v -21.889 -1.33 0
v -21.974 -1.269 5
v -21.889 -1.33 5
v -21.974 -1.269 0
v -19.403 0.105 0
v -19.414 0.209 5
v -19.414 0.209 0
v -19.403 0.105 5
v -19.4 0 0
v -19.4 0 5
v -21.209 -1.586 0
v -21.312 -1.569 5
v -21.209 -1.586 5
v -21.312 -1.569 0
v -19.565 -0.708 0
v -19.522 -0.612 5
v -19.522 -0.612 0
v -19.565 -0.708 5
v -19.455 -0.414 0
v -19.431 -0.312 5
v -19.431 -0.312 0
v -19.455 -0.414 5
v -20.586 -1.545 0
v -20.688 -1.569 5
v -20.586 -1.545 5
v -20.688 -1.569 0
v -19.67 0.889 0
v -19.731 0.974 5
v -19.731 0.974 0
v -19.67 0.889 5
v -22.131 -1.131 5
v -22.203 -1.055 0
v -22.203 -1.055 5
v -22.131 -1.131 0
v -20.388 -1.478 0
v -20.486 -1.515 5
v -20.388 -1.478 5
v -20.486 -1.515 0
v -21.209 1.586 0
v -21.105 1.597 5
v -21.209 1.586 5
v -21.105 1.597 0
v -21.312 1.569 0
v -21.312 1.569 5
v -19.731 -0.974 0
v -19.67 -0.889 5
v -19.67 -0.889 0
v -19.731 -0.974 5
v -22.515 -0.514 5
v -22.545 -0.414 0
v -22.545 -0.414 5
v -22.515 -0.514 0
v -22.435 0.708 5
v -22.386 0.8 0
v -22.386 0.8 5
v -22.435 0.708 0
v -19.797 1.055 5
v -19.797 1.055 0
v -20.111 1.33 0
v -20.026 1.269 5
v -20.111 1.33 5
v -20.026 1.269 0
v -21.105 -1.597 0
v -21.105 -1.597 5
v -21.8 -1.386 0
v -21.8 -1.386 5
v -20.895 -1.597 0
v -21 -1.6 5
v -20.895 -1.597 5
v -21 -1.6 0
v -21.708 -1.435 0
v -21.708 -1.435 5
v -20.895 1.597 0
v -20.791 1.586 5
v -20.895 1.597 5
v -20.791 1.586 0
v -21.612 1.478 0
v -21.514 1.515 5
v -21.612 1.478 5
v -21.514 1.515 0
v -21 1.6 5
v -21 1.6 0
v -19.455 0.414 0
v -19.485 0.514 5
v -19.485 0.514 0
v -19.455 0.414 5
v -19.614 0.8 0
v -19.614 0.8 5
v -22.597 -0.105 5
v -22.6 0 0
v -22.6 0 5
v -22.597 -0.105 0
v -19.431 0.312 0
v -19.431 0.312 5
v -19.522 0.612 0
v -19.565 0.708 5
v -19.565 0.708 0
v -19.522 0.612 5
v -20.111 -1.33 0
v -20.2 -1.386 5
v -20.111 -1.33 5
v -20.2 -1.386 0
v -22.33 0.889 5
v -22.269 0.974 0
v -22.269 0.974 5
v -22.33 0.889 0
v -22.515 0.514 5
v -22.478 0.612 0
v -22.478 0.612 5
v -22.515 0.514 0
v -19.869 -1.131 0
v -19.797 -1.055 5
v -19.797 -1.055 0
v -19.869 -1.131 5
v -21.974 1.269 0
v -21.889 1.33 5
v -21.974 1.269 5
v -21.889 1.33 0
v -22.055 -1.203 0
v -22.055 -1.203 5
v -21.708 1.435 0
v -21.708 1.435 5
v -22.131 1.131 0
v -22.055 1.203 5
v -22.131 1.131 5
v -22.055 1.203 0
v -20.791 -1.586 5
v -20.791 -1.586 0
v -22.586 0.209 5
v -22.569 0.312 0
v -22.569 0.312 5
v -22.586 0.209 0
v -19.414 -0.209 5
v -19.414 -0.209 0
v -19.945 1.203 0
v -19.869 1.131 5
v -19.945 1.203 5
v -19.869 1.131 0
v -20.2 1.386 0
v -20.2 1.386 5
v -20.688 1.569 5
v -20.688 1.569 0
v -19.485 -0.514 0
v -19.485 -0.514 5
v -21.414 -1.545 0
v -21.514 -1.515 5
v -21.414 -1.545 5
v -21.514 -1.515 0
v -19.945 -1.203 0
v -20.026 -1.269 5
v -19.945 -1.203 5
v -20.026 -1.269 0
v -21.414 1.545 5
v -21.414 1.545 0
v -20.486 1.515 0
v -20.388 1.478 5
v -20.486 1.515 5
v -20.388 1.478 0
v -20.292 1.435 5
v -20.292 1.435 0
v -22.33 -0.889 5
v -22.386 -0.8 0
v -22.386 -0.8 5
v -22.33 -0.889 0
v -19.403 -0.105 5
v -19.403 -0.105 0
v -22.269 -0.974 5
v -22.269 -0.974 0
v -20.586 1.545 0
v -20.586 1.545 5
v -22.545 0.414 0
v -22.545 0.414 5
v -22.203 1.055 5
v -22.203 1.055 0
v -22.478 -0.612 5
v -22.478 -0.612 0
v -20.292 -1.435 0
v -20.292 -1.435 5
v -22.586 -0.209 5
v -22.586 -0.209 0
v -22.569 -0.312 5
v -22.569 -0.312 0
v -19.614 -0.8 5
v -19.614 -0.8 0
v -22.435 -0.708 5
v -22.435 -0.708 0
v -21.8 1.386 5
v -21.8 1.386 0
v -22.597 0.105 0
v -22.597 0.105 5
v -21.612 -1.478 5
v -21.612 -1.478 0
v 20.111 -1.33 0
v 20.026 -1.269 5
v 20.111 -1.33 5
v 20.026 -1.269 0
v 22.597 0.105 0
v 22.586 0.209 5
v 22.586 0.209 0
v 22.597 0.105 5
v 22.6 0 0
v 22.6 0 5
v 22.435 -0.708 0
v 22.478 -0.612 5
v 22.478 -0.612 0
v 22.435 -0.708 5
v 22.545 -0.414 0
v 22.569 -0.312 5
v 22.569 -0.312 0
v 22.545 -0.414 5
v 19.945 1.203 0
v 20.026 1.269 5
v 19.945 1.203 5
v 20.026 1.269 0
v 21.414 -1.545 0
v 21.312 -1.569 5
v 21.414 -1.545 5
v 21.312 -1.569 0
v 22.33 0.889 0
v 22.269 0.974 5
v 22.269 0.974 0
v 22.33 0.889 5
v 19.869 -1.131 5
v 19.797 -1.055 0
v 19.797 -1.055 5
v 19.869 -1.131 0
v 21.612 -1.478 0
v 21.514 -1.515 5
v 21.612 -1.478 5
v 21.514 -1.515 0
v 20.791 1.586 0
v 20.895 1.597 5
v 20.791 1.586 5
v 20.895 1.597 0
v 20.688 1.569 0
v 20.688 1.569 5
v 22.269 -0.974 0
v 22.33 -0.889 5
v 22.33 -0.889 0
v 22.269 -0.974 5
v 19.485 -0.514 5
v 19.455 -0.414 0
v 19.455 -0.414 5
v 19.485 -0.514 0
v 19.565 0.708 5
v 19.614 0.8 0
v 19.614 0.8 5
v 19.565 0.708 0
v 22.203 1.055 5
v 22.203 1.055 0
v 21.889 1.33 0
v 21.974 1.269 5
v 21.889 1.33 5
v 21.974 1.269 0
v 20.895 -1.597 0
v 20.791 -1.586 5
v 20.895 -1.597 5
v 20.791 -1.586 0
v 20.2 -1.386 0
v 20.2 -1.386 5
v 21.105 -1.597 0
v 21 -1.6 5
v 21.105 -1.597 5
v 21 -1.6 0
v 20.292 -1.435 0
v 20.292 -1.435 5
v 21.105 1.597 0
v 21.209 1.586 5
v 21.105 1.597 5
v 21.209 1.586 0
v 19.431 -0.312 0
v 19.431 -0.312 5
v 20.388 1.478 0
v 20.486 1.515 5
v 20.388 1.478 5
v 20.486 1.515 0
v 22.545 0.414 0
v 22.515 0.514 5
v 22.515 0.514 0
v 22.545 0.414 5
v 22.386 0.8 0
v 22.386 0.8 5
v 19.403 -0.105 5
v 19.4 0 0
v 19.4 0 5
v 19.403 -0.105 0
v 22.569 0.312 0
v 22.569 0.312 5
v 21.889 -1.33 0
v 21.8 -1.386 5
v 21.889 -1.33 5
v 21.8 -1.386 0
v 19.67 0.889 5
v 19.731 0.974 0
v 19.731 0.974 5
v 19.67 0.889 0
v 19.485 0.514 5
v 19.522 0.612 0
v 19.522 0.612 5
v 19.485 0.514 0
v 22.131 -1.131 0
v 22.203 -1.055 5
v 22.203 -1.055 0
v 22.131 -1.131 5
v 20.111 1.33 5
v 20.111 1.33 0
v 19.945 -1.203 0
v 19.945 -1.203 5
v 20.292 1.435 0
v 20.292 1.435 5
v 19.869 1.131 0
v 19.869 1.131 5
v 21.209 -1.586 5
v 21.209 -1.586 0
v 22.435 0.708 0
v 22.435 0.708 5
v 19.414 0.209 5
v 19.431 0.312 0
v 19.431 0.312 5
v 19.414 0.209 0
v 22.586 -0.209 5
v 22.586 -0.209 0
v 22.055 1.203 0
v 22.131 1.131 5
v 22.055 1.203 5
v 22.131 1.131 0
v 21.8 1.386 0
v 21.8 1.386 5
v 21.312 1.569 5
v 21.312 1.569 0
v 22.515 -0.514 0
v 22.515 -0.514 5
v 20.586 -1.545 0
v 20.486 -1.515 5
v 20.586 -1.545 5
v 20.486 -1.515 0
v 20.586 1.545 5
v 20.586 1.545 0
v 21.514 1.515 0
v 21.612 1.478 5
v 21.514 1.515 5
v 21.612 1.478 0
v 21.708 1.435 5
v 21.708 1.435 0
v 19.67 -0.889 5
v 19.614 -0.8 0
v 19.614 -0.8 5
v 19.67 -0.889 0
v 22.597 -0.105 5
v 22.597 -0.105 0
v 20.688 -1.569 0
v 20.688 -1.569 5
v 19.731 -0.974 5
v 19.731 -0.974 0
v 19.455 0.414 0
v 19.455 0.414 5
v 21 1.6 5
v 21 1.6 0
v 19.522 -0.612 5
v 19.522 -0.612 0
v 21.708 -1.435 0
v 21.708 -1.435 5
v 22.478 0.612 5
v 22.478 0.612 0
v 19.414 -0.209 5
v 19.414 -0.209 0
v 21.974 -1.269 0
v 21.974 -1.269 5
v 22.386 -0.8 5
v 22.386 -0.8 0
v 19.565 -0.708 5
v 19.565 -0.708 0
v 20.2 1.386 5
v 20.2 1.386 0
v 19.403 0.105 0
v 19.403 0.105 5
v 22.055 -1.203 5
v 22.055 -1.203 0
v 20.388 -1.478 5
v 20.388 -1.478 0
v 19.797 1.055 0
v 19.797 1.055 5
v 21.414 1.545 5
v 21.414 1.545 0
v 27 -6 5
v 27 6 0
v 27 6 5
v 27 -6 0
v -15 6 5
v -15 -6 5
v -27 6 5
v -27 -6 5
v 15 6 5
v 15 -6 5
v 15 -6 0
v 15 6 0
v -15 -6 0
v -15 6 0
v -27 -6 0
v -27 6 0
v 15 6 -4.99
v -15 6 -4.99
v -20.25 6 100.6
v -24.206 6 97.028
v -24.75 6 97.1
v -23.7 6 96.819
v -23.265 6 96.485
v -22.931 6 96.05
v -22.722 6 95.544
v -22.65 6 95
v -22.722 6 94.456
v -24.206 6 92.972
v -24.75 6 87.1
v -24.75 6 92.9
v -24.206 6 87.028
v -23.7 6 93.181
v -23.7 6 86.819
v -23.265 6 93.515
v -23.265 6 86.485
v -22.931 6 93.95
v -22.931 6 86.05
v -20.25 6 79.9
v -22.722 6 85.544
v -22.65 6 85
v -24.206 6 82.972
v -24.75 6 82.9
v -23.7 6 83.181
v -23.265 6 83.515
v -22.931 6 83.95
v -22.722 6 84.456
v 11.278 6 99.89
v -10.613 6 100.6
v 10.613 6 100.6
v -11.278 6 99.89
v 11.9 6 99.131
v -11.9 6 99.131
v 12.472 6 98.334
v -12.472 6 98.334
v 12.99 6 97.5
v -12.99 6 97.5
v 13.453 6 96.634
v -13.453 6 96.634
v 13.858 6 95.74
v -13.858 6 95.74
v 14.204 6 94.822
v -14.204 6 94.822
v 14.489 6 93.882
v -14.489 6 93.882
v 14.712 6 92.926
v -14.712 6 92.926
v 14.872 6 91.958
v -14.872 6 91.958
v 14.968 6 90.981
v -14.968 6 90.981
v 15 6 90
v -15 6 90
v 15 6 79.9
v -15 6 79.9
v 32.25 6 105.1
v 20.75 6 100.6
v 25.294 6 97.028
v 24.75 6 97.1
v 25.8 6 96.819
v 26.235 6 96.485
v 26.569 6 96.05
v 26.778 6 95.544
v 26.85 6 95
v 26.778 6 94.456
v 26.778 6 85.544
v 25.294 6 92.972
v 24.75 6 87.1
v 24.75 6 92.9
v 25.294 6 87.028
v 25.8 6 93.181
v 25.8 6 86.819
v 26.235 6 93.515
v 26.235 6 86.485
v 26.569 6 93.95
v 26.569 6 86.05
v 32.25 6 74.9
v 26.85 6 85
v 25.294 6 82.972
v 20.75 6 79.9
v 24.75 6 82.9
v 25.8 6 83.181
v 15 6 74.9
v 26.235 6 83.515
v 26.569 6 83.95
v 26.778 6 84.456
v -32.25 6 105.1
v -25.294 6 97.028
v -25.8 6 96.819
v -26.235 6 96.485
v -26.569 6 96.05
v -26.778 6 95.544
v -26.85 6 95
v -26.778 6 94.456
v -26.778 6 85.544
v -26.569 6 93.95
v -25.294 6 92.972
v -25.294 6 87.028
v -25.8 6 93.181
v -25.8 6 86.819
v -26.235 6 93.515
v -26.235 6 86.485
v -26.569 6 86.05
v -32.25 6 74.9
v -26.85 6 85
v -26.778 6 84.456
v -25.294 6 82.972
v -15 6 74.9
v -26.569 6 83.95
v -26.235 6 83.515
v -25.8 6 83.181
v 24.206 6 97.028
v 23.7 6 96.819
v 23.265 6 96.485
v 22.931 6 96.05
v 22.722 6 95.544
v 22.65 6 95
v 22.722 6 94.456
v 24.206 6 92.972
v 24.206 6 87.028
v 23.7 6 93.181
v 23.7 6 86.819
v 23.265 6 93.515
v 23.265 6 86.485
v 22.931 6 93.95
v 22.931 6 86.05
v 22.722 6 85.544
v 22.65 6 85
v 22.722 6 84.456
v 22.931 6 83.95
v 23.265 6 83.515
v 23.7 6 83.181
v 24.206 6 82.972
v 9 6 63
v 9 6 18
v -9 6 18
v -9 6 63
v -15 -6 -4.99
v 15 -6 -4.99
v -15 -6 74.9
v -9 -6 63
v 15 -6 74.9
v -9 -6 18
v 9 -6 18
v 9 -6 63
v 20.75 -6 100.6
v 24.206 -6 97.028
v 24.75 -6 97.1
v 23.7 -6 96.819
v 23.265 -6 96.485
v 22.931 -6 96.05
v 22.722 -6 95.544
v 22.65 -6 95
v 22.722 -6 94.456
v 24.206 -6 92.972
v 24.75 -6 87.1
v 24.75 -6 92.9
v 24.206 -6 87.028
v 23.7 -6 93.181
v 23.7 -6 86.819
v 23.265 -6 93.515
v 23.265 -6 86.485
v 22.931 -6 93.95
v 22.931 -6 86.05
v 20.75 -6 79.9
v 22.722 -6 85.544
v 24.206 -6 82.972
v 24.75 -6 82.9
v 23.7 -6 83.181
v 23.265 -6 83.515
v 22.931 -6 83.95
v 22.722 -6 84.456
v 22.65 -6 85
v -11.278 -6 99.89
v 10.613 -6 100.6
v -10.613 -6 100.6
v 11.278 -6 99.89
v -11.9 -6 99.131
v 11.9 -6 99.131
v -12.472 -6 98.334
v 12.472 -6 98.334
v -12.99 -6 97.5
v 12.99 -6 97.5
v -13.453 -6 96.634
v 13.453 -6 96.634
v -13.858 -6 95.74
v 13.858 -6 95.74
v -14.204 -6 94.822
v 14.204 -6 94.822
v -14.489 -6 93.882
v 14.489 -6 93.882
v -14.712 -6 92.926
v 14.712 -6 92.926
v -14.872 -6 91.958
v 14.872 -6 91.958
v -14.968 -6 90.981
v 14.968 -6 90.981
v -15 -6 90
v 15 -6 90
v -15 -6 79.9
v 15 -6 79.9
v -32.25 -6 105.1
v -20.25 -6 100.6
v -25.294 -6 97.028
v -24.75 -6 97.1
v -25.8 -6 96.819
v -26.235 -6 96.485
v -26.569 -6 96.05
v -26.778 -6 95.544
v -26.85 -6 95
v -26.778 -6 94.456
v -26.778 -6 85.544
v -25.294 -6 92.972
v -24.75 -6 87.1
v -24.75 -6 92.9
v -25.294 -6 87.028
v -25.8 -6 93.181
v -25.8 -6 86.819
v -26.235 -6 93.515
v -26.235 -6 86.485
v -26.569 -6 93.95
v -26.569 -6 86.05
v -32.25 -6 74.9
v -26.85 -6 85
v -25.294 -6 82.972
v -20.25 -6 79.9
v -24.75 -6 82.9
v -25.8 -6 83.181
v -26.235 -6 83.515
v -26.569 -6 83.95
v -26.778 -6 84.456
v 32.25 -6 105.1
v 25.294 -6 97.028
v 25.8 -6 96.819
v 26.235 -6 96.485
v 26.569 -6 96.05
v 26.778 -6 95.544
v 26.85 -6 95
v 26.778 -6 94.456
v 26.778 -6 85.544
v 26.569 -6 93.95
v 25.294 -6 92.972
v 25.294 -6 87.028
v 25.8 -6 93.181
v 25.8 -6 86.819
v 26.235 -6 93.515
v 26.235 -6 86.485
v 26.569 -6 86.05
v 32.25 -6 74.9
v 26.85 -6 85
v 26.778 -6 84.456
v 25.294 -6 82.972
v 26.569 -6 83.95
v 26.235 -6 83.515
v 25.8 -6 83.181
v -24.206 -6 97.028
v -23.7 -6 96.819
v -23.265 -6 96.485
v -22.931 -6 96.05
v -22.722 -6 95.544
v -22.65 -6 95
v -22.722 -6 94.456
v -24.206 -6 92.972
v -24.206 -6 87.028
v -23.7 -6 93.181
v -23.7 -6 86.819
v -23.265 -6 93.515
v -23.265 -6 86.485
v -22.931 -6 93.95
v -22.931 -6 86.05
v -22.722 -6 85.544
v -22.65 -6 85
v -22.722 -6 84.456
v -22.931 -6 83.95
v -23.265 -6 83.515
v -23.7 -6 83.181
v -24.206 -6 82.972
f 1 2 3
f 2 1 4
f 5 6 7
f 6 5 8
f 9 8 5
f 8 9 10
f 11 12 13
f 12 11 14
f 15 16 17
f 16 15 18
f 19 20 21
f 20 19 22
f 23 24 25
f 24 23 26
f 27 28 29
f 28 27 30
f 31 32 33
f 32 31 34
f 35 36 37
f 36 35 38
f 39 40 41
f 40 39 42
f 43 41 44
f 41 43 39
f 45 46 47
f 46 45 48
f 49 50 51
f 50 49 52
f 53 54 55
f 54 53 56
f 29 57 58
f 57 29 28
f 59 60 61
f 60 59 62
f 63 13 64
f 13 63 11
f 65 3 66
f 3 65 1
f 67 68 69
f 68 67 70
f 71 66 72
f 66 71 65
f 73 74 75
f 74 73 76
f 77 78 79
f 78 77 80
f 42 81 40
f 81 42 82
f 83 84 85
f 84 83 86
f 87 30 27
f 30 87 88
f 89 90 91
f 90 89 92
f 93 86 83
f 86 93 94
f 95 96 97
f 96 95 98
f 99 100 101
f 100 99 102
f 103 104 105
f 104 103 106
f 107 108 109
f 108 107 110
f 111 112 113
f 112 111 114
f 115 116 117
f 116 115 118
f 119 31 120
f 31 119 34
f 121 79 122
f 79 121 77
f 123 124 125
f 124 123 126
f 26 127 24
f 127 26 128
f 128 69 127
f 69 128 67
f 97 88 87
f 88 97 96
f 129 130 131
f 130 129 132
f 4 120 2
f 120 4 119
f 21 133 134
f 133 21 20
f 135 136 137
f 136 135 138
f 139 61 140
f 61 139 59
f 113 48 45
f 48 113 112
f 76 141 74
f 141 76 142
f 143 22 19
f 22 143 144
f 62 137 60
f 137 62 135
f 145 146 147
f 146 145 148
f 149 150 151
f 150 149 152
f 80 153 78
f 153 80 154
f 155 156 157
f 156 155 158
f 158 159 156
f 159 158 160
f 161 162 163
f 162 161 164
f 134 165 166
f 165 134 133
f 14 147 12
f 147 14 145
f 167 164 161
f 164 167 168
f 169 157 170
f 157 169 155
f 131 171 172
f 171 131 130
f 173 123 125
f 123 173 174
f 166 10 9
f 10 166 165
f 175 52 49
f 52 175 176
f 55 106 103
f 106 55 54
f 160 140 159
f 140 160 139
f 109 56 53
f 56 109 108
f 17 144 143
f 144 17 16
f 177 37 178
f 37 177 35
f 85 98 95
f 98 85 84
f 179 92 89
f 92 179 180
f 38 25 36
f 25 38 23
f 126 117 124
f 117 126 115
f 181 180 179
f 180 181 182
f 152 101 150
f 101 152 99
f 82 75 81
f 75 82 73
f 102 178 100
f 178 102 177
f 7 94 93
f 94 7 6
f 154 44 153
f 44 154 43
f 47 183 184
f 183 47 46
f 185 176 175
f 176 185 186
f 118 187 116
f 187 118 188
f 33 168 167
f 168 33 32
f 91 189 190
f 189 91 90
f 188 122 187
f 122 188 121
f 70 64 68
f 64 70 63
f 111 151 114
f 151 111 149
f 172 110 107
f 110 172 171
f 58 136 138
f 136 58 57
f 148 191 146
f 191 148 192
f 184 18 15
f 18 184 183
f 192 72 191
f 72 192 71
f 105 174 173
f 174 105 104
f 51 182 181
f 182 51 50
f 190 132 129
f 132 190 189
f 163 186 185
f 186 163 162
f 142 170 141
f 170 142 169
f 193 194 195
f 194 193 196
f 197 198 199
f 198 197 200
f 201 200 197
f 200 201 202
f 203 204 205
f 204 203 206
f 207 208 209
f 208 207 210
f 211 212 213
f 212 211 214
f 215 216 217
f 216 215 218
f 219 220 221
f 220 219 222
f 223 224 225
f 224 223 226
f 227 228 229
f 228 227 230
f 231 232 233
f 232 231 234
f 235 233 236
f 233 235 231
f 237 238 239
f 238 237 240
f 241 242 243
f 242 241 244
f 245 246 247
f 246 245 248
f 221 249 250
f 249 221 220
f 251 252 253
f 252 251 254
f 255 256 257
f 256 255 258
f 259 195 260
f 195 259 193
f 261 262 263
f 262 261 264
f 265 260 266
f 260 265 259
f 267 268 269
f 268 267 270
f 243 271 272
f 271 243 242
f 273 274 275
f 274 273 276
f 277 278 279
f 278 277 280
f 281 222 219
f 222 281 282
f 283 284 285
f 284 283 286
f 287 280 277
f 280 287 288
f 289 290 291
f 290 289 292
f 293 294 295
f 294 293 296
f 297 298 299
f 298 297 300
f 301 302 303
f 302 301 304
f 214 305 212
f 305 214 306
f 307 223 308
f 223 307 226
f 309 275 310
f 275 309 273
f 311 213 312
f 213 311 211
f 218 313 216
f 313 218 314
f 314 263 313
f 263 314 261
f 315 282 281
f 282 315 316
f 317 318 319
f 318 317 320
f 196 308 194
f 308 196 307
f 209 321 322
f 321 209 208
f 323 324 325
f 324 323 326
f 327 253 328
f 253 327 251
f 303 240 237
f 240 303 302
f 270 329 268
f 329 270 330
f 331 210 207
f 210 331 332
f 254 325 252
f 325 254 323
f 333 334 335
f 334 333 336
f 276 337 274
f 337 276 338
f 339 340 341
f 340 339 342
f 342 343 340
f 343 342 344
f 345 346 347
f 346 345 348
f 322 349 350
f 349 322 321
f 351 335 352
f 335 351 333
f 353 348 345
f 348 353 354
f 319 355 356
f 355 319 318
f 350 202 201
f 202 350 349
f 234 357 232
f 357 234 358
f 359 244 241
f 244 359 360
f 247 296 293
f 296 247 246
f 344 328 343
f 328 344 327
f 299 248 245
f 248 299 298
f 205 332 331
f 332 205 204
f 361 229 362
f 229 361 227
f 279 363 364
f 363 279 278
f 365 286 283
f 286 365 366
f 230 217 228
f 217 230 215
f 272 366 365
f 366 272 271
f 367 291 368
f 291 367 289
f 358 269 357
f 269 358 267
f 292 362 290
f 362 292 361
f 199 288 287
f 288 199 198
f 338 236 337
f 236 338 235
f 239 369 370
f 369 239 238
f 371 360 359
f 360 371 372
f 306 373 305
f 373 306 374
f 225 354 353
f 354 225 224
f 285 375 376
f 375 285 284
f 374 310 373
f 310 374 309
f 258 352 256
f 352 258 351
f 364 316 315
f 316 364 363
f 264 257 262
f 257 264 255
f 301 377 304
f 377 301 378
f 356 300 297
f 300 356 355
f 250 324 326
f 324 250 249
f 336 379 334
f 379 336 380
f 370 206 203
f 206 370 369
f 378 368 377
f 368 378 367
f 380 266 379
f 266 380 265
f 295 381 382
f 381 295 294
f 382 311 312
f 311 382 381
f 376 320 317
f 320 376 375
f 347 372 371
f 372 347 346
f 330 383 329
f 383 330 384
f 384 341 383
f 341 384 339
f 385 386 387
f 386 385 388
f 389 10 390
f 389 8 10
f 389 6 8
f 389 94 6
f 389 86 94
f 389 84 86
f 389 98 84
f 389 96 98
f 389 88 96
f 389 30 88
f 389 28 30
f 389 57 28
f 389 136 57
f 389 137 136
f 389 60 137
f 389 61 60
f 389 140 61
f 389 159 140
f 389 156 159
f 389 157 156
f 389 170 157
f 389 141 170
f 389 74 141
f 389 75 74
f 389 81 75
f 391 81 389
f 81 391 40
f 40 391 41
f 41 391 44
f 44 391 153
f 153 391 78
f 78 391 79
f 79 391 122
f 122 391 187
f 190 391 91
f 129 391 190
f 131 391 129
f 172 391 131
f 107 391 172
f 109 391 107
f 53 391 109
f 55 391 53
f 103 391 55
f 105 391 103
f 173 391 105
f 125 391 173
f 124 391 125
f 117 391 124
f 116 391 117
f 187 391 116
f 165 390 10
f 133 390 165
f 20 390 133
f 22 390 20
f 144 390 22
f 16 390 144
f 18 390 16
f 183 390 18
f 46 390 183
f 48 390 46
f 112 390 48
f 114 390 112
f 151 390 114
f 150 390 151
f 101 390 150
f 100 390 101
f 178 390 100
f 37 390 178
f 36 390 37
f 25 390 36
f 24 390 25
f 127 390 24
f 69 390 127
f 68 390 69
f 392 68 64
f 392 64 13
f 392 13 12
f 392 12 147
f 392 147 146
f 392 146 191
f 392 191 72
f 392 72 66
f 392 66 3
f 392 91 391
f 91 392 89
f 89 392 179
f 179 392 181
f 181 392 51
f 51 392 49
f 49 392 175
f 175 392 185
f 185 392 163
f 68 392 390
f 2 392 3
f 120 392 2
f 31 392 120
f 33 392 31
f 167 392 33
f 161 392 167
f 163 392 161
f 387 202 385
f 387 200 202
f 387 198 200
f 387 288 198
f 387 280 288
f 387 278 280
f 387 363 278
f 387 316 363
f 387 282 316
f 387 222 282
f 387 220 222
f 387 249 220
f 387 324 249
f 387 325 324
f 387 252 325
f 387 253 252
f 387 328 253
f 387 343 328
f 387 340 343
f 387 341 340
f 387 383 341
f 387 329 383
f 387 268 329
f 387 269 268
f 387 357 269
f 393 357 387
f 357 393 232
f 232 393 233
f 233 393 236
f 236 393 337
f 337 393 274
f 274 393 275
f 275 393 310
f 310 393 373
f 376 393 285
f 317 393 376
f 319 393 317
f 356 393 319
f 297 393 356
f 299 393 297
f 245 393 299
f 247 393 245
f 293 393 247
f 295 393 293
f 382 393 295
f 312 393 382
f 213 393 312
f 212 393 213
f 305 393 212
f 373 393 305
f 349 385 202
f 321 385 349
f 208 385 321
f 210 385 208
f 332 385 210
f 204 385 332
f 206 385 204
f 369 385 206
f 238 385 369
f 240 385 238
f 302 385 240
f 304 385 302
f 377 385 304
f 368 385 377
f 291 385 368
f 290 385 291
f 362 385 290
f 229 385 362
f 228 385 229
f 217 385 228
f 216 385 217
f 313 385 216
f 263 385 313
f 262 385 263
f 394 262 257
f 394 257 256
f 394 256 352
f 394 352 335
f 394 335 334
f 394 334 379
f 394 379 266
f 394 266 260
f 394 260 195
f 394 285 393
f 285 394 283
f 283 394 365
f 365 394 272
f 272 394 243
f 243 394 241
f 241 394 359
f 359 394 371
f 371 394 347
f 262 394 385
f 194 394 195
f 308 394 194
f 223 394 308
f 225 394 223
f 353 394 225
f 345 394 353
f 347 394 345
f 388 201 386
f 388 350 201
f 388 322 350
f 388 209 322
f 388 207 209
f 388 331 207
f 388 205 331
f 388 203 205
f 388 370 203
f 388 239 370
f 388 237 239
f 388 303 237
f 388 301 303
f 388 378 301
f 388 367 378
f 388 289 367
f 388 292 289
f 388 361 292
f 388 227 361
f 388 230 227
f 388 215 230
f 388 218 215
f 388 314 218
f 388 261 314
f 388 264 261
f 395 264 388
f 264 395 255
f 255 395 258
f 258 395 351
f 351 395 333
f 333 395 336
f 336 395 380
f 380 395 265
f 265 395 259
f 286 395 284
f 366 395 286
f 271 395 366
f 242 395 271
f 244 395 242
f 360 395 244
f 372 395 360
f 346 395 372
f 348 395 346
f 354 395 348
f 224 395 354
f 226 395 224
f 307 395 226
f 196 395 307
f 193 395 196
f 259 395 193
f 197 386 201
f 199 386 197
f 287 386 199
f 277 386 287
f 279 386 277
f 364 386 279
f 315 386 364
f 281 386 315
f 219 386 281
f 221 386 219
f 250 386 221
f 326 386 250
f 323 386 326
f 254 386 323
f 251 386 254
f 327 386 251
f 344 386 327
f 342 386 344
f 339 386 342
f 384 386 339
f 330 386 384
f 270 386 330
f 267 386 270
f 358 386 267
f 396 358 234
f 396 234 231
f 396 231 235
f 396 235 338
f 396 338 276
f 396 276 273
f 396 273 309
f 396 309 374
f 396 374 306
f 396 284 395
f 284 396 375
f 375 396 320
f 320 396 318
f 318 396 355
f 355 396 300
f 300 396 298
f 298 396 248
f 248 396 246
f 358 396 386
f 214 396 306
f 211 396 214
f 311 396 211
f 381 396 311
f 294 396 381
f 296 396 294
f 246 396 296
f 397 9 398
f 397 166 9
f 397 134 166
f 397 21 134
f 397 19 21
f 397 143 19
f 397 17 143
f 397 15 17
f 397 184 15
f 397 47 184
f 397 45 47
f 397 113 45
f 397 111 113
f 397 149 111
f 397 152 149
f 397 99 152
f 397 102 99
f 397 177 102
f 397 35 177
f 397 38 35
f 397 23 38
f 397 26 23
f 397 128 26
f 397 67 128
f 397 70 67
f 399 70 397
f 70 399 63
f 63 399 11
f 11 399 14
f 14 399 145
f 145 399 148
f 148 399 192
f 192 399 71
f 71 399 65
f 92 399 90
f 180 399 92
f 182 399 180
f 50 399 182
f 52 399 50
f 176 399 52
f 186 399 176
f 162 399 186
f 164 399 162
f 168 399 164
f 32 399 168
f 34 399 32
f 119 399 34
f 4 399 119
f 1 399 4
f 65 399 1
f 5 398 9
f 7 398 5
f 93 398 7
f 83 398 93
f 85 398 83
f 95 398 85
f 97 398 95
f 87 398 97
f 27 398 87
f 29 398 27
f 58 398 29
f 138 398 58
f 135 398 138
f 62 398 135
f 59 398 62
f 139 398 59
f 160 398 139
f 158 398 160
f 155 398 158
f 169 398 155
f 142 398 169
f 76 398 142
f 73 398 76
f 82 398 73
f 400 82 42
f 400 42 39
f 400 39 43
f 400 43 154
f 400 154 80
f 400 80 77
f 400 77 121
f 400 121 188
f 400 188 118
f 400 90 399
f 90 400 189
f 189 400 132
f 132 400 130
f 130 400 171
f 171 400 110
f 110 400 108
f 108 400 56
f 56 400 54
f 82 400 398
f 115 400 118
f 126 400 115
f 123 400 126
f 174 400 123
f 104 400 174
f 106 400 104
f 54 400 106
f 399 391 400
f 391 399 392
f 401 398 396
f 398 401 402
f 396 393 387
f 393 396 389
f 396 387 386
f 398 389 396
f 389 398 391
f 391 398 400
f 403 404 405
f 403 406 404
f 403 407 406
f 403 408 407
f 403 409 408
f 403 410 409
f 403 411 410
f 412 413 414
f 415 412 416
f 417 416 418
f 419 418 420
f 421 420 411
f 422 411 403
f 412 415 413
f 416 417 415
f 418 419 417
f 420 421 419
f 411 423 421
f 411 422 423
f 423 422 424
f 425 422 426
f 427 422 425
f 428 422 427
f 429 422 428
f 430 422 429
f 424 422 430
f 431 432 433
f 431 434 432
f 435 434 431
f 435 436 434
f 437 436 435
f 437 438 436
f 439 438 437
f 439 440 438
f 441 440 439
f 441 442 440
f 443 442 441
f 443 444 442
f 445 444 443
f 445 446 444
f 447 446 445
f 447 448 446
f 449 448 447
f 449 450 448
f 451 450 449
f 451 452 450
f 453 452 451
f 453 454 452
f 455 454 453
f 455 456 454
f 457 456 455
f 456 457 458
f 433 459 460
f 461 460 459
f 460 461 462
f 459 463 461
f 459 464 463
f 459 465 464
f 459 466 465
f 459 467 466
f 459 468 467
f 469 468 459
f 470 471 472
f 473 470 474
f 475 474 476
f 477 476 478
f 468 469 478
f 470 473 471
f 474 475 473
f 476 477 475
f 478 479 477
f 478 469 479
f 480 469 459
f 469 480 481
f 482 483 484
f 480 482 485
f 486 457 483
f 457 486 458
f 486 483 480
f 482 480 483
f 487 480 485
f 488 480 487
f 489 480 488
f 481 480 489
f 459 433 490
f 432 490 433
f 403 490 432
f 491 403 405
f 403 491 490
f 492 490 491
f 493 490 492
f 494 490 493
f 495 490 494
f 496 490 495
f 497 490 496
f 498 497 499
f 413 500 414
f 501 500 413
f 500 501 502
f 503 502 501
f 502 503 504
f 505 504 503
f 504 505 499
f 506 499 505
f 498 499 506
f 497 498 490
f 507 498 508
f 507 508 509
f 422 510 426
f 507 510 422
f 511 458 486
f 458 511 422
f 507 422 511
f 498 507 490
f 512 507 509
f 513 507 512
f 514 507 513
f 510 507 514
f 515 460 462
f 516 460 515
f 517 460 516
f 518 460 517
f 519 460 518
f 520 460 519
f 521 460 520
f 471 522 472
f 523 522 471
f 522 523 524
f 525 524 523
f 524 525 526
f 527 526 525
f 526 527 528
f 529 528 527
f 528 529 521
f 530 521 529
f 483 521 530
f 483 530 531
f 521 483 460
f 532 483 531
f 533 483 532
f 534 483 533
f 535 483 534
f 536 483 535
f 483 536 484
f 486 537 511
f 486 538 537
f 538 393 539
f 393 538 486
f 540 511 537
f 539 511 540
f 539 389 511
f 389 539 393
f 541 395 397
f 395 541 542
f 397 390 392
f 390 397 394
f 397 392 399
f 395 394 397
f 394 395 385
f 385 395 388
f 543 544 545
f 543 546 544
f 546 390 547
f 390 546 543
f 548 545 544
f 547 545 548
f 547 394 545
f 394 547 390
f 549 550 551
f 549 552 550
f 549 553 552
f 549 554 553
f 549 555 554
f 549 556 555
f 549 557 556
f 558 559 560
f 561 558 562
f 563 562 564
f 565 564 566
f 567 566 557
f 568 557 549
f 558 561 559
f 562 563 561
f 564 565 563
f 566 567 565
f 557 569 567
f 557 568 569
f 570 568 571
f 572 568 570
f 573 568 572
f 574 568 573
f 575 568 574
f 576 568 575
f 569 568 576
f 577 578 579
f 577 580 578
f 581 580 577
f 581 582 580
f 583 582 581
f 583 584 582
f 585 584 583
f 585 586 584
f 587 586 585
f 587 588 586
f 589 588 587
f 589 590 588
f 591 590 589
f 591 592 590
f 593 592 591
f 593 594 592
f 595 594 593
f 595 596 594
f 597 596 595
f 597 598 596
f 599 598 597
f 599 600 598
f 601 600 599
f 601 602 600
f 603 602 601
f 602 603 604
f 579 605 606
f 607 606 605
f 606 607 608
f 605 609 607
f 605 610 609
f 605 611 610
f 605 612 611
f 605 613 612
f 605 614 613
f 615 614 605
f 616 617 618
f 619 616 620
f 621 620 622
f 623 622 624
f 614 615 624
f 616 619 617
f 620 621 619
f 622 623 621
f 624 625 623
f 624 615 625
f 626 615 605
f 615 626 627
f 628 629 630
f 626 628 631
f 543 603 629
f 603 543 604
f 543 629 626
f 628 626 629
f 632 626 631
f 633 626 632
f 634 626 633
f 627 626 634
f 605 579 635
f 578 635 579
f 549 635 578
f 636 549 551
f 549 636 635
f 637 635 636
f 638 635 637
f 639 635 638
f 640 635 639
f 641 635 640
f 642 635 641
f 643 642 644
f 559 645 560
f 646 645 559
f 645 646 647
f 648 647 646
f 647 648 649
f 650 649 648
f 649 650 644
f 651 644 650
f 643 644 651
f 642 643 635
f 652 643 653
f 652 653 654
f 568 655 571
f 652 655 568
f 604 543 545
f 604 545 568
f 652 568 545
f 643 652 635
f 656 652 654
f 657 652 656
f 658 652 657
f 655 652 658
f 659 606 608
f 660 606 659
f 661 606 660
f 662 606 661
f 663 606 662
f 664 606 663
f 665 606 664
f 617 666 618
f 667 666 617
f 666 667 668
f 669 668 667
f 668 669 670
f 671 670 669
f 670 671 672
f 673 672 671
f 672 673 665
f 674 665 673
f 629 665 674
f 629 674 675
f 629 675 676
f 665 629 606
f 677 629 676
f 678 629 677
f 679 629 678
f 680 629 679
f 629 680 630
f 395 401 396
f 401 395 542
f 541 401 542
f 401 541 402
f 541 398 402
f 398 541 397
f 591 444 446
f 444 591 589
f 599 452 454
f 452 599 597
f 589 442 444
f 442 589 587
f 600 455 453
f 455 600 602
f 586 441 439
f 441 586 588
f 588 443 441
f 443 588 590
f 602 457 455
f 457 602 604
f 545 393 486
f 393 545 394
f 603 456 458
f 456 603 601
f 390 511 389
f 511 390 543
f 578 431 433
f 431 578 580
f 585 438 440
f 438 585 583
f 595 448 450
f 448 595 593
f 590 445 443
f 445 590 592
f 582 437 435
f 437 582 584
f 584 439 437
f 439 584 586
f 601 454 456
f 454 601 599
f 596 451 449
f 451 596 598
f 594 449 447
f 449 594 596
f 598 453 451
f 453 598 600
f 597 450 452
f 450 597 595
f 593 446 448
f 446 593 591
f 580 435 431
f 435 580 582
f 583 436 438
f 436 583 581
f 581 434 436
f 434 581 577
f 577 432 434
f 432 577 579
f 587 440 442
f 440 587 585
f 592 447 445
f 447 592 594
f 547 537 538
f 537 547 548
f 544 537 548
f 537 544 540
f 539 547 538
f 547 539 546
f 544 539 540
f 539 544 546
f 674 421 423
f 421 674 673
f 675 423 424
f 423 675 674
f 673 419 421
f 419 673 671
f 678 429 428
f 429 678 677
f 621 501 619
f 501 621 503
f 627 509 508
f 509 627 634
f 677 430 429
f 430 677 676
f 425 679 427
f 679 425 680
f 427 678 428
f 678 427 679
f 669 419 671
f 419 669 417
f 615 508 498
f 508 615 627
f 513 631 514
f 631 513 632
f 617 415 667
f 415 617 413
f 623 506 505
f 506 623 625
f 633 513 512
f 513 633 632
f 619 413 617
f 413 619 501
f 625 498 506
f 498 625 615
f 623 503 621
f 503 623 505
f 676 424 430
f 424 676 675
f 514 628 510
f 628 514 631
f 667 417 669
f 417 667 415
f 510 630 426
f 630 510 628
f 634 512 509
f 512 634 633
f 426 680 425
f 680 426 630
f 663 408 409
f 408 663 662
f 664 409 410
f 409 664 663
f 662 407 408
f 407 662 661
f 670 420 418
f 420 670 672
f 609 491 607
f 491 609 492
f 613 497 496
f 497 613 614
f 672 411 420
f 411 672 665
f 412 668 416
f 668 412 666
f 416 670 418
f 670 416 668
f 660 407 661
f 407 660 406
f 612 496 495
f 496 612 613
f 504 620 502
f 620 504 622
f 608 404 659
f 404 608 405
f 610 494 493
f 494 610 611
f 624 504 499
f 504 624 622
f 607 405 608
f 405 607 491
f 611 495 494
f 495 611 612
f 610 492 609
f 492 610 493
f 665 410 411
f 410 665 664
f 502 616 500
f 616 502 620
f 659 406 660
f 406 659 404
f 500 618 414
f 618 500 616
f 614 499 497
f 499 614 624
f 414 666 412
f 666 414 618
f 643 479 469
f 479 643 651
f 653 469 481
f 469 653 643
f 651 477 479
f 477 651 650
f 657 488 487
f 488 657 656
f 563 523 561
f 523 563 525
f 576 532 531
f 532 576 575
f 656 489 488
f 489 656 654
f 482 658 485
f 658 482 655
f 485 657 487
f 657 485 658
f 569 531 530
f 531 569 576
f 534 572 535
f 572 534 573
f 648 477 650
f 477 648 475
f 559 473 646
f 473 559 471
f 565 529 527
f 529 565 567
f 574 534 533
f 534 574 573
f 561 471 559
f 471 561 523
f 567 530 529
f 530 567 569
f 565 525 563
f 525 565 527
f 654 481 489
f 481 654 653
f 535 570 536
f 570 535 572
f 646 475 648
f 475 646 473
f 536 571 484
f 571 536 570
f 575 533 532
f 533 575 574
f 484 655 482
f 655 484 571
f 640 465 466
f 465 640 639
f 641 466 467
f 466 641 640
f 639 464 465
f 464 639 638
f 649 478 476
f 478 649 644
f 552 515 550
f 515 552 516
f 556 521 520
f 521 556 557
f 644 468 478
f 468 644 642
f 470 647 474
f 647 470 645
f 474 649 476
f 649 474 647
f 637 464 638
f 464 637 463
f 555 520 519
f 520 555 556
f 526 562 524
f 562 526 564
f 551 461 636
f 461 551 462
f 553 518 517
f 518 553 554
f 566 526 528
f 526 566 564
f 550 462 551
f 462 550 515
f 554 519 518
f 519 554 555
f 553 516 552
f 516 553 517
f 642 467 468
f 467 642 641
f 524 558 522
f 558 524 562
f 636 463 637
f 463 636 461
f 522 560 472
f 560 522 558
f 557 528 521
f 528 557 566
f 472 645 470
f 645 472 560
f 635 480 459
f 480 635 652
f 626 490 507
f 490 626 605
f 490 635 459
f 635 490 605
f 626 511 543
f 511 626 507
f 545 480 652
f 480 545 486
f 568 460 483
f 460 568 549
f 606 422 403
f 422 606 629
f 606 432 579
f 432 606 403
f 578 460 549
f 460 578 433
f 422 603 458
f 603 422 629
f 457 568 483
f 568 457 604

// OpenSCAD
// file: config.scad
// SportCam — shared parametric dimensions (mm).
// Every part file includes this; tweak here, re-render, everything stays consistent.

$fn = 96;
clr = 0.25;                    // general printed-fit clearance per side

// ---- pan stage -------------------------------------------------------------
base_d        = 150;           // base housing outer diameter
base_h        = 62;            // base housing height
base_wall     = 3;

ls_size       = 76.2;          // 3" lazy-susan square plate
ls_bolt       = 66;            // bolt spacing (square)
ls_hole_d     = 5;             // M5-ish mounting holes
ls_thick      = 8;             // bearing stack height

sr_body_d     = 22.5;          // slip ring body (Adafruit 736 class)
sr_flange_d   = 44.5;          // stationary flange diameter
sr_flange_t   = 2.5;
sr_hole_space = 33;            // two flange screw holes, M3
sr_wire_d     = 14;            // wire bundle pass-through

nema_face     = 42.3;          // NEMA17
nema_bolt     = 31;            // M3 square pattern
nema_boss_d   = 22.5;
nema_shaft_d  = 5;

// ---- belt drive ------------------------------------------------------------
gt2_pitch       = 2.0;
ring_teeth      = 120;         // printed ring pulley (6:1 with 20T motor pulley)
ring_pitch_r    = ring_teeth * gt2_pitch / (2 * PI);   // ≈ 38.2
ring_id         = 60;          // clears the 44.5 slip-ring flange with margin
pulley_h        = 8;           // belt is 6 mm wide
flange_lip      = 1.5;

// ---- rotating platform -----------------------------------------------------
plat_d        = 160;
plat_t        = 5;
plat_bolt_circle = 70;         // M3 bosses meeting the lazy-susan top plate

pi_l = 85; pi_w = 56;          // Raspberry Pi 5
pi_hole_dx = 58; pi_hole_dy = 49;
pi_hole_off = 3.5;             // hole inset from board corner
pi_standoff_h = 6;

// ---- tilt ------------------------------------------------------------------
servo_l = 40.5; servo_w = 20.2; servo_h = 38.5;   // DS3225 body
servo_tab_l = 54.5;            // over mounting tabs
servo_hole_dx = 49.5; servo_hole_dy = 10;         // 4 × M4 tab holes
servo_axis_off = 9.9;          // spline axis from body front face

tilt_bearing_od = 18; tilt_bearing_w = 4;         // 6701ZZ
tilt_shaft_d = 12;
tower_h = 90;                  // tilt-axis height above platform
tower_w = 30; tower_t = 12;
tower_gap = 90;                // clear width between the two uprights

// ---- camera cradle ---------------------------------------------------------
lens_d = 33;                   // Arducam zoom-lens barrel — MEASURE YOURS
cam_board_w = 25;              // IMX219 board width behind lens
horn_d = 21;                   // DS3225 round metal horn
horn_screw_circle = 14;        // 4 × M3 on the horn
cradle_w = 60;

// ---- UWB anchor arm --------------------------------------------------------
arm_len = 200;                 // baseline = 2 × arm_len = 400
arm_w = 18; arm_t = 8;
uwb_l = 55; uwb_w = 30;        // ESP32-UWB board
uwb_hole_dx = 49; uwb_hole_dy = 24;               // corner holes — MEASURE YOURS

// ---- wearable pod ----------------------------------------------------------
pod_inner_l = 58; pod_inner_w = 33; pod_inner_h = 22;  // board + LiPo + TP4056
pod_wall = 2.0;
strap_w = 26;                  // elastic armband width
// main file
// Tilt tower upright. Render twice:
//   side = "servo"   — pocket for the DS3225, tab screw holes
//   side = "bearing" — press-fit seat for the 6701ZZ bearing
// Feet drop into the platform slots and screw down from below.
include <config.scad>

side = "servo";                // override with -D side=\"bearing\"

foot_l = tower_w + 24;

module foot() {
    translate([0, 0, plat_t / 2])
        difference() {
            cube([foot_l, tower_t, plat_t], center = true);
            for (x = [-1, 1])
                translate([x * (tower_w / 2 + 6), 0, 0])
                    cylinder(d = 3.2, h = plat_t + 2, center = true);
        }
    // tenon that drops into the platform slot
    translate([0, 0, -plat_t / 2 + 0.01])
        cube([tower_w, tower_t, plat_t], center = true);
}

module upright() {
    difference() {
        hull() {
            translate([0, 0, 2]) cube([tower_w, tower_t, 4], center = true);
            translate([0, 0, tower_h]) rotate([90, 0, 0])
                cylinder(d = tower_w, h = tower_t, center = true);
        }
        // lightening window
        translate([0, 0, tower_h * 0.45])
            cube([tower_w - 12, tower_t + 2, tower_h * 0.5], center = true);
    }
}

module servo_head() {
    // DS3225 nests through a rectangular window; tabs screw to the face
    translate([0, 0, tower_h]) rotate([90, 0, 0]) {
        translate([-(servo_tab_l + 10) / 2, -(servo_w + 10) / 2, -tower_t / 2]) difference() {
            cube([servo_tab_l + 10, servo_w + 10, tower_t], center = false);
            translate([5 + (servo_tab_l - servo_l) / 2, 5, -1])
                cube([servo_l + 2 * clr, servo_w + 2 * clr, tower_t + 2]);
            for (x = [-1, 1], y = [-1, 1])
                translate([5 + servo_tab_l / 2 + x * servo_hole_dx / 2,
                           5 + servo_w / 2 + y * servo_hole_dy / 2, -1])
                    cylinder(d = 4.2, h = tower_t + 2, $fn = 24);
        }
    }
}

module bearing_head() {
    translate([0, 0, tower_h]) rotate([90, 0, 0])
        difference() {
            cylinder(d = tilt_bearing_od + 8, h = tower_t, center = true);
            // press-fit seat, open one side
            translate([0, 0, tower_t / 2 - tilt_bearing_w])
                cylinder(d = tilt_bearing_od + 2 * 0.1, h = tilt_bearing_w + 1);
            cylinder(d = tilt_bearing_od - 3, h = tower_t + 2, center = true);
        }
}

module tilt_tower() {
    foot();
    upright();
    if (side == "servo") servo_head();
    else bearing_head();
}

tilt_tower();
